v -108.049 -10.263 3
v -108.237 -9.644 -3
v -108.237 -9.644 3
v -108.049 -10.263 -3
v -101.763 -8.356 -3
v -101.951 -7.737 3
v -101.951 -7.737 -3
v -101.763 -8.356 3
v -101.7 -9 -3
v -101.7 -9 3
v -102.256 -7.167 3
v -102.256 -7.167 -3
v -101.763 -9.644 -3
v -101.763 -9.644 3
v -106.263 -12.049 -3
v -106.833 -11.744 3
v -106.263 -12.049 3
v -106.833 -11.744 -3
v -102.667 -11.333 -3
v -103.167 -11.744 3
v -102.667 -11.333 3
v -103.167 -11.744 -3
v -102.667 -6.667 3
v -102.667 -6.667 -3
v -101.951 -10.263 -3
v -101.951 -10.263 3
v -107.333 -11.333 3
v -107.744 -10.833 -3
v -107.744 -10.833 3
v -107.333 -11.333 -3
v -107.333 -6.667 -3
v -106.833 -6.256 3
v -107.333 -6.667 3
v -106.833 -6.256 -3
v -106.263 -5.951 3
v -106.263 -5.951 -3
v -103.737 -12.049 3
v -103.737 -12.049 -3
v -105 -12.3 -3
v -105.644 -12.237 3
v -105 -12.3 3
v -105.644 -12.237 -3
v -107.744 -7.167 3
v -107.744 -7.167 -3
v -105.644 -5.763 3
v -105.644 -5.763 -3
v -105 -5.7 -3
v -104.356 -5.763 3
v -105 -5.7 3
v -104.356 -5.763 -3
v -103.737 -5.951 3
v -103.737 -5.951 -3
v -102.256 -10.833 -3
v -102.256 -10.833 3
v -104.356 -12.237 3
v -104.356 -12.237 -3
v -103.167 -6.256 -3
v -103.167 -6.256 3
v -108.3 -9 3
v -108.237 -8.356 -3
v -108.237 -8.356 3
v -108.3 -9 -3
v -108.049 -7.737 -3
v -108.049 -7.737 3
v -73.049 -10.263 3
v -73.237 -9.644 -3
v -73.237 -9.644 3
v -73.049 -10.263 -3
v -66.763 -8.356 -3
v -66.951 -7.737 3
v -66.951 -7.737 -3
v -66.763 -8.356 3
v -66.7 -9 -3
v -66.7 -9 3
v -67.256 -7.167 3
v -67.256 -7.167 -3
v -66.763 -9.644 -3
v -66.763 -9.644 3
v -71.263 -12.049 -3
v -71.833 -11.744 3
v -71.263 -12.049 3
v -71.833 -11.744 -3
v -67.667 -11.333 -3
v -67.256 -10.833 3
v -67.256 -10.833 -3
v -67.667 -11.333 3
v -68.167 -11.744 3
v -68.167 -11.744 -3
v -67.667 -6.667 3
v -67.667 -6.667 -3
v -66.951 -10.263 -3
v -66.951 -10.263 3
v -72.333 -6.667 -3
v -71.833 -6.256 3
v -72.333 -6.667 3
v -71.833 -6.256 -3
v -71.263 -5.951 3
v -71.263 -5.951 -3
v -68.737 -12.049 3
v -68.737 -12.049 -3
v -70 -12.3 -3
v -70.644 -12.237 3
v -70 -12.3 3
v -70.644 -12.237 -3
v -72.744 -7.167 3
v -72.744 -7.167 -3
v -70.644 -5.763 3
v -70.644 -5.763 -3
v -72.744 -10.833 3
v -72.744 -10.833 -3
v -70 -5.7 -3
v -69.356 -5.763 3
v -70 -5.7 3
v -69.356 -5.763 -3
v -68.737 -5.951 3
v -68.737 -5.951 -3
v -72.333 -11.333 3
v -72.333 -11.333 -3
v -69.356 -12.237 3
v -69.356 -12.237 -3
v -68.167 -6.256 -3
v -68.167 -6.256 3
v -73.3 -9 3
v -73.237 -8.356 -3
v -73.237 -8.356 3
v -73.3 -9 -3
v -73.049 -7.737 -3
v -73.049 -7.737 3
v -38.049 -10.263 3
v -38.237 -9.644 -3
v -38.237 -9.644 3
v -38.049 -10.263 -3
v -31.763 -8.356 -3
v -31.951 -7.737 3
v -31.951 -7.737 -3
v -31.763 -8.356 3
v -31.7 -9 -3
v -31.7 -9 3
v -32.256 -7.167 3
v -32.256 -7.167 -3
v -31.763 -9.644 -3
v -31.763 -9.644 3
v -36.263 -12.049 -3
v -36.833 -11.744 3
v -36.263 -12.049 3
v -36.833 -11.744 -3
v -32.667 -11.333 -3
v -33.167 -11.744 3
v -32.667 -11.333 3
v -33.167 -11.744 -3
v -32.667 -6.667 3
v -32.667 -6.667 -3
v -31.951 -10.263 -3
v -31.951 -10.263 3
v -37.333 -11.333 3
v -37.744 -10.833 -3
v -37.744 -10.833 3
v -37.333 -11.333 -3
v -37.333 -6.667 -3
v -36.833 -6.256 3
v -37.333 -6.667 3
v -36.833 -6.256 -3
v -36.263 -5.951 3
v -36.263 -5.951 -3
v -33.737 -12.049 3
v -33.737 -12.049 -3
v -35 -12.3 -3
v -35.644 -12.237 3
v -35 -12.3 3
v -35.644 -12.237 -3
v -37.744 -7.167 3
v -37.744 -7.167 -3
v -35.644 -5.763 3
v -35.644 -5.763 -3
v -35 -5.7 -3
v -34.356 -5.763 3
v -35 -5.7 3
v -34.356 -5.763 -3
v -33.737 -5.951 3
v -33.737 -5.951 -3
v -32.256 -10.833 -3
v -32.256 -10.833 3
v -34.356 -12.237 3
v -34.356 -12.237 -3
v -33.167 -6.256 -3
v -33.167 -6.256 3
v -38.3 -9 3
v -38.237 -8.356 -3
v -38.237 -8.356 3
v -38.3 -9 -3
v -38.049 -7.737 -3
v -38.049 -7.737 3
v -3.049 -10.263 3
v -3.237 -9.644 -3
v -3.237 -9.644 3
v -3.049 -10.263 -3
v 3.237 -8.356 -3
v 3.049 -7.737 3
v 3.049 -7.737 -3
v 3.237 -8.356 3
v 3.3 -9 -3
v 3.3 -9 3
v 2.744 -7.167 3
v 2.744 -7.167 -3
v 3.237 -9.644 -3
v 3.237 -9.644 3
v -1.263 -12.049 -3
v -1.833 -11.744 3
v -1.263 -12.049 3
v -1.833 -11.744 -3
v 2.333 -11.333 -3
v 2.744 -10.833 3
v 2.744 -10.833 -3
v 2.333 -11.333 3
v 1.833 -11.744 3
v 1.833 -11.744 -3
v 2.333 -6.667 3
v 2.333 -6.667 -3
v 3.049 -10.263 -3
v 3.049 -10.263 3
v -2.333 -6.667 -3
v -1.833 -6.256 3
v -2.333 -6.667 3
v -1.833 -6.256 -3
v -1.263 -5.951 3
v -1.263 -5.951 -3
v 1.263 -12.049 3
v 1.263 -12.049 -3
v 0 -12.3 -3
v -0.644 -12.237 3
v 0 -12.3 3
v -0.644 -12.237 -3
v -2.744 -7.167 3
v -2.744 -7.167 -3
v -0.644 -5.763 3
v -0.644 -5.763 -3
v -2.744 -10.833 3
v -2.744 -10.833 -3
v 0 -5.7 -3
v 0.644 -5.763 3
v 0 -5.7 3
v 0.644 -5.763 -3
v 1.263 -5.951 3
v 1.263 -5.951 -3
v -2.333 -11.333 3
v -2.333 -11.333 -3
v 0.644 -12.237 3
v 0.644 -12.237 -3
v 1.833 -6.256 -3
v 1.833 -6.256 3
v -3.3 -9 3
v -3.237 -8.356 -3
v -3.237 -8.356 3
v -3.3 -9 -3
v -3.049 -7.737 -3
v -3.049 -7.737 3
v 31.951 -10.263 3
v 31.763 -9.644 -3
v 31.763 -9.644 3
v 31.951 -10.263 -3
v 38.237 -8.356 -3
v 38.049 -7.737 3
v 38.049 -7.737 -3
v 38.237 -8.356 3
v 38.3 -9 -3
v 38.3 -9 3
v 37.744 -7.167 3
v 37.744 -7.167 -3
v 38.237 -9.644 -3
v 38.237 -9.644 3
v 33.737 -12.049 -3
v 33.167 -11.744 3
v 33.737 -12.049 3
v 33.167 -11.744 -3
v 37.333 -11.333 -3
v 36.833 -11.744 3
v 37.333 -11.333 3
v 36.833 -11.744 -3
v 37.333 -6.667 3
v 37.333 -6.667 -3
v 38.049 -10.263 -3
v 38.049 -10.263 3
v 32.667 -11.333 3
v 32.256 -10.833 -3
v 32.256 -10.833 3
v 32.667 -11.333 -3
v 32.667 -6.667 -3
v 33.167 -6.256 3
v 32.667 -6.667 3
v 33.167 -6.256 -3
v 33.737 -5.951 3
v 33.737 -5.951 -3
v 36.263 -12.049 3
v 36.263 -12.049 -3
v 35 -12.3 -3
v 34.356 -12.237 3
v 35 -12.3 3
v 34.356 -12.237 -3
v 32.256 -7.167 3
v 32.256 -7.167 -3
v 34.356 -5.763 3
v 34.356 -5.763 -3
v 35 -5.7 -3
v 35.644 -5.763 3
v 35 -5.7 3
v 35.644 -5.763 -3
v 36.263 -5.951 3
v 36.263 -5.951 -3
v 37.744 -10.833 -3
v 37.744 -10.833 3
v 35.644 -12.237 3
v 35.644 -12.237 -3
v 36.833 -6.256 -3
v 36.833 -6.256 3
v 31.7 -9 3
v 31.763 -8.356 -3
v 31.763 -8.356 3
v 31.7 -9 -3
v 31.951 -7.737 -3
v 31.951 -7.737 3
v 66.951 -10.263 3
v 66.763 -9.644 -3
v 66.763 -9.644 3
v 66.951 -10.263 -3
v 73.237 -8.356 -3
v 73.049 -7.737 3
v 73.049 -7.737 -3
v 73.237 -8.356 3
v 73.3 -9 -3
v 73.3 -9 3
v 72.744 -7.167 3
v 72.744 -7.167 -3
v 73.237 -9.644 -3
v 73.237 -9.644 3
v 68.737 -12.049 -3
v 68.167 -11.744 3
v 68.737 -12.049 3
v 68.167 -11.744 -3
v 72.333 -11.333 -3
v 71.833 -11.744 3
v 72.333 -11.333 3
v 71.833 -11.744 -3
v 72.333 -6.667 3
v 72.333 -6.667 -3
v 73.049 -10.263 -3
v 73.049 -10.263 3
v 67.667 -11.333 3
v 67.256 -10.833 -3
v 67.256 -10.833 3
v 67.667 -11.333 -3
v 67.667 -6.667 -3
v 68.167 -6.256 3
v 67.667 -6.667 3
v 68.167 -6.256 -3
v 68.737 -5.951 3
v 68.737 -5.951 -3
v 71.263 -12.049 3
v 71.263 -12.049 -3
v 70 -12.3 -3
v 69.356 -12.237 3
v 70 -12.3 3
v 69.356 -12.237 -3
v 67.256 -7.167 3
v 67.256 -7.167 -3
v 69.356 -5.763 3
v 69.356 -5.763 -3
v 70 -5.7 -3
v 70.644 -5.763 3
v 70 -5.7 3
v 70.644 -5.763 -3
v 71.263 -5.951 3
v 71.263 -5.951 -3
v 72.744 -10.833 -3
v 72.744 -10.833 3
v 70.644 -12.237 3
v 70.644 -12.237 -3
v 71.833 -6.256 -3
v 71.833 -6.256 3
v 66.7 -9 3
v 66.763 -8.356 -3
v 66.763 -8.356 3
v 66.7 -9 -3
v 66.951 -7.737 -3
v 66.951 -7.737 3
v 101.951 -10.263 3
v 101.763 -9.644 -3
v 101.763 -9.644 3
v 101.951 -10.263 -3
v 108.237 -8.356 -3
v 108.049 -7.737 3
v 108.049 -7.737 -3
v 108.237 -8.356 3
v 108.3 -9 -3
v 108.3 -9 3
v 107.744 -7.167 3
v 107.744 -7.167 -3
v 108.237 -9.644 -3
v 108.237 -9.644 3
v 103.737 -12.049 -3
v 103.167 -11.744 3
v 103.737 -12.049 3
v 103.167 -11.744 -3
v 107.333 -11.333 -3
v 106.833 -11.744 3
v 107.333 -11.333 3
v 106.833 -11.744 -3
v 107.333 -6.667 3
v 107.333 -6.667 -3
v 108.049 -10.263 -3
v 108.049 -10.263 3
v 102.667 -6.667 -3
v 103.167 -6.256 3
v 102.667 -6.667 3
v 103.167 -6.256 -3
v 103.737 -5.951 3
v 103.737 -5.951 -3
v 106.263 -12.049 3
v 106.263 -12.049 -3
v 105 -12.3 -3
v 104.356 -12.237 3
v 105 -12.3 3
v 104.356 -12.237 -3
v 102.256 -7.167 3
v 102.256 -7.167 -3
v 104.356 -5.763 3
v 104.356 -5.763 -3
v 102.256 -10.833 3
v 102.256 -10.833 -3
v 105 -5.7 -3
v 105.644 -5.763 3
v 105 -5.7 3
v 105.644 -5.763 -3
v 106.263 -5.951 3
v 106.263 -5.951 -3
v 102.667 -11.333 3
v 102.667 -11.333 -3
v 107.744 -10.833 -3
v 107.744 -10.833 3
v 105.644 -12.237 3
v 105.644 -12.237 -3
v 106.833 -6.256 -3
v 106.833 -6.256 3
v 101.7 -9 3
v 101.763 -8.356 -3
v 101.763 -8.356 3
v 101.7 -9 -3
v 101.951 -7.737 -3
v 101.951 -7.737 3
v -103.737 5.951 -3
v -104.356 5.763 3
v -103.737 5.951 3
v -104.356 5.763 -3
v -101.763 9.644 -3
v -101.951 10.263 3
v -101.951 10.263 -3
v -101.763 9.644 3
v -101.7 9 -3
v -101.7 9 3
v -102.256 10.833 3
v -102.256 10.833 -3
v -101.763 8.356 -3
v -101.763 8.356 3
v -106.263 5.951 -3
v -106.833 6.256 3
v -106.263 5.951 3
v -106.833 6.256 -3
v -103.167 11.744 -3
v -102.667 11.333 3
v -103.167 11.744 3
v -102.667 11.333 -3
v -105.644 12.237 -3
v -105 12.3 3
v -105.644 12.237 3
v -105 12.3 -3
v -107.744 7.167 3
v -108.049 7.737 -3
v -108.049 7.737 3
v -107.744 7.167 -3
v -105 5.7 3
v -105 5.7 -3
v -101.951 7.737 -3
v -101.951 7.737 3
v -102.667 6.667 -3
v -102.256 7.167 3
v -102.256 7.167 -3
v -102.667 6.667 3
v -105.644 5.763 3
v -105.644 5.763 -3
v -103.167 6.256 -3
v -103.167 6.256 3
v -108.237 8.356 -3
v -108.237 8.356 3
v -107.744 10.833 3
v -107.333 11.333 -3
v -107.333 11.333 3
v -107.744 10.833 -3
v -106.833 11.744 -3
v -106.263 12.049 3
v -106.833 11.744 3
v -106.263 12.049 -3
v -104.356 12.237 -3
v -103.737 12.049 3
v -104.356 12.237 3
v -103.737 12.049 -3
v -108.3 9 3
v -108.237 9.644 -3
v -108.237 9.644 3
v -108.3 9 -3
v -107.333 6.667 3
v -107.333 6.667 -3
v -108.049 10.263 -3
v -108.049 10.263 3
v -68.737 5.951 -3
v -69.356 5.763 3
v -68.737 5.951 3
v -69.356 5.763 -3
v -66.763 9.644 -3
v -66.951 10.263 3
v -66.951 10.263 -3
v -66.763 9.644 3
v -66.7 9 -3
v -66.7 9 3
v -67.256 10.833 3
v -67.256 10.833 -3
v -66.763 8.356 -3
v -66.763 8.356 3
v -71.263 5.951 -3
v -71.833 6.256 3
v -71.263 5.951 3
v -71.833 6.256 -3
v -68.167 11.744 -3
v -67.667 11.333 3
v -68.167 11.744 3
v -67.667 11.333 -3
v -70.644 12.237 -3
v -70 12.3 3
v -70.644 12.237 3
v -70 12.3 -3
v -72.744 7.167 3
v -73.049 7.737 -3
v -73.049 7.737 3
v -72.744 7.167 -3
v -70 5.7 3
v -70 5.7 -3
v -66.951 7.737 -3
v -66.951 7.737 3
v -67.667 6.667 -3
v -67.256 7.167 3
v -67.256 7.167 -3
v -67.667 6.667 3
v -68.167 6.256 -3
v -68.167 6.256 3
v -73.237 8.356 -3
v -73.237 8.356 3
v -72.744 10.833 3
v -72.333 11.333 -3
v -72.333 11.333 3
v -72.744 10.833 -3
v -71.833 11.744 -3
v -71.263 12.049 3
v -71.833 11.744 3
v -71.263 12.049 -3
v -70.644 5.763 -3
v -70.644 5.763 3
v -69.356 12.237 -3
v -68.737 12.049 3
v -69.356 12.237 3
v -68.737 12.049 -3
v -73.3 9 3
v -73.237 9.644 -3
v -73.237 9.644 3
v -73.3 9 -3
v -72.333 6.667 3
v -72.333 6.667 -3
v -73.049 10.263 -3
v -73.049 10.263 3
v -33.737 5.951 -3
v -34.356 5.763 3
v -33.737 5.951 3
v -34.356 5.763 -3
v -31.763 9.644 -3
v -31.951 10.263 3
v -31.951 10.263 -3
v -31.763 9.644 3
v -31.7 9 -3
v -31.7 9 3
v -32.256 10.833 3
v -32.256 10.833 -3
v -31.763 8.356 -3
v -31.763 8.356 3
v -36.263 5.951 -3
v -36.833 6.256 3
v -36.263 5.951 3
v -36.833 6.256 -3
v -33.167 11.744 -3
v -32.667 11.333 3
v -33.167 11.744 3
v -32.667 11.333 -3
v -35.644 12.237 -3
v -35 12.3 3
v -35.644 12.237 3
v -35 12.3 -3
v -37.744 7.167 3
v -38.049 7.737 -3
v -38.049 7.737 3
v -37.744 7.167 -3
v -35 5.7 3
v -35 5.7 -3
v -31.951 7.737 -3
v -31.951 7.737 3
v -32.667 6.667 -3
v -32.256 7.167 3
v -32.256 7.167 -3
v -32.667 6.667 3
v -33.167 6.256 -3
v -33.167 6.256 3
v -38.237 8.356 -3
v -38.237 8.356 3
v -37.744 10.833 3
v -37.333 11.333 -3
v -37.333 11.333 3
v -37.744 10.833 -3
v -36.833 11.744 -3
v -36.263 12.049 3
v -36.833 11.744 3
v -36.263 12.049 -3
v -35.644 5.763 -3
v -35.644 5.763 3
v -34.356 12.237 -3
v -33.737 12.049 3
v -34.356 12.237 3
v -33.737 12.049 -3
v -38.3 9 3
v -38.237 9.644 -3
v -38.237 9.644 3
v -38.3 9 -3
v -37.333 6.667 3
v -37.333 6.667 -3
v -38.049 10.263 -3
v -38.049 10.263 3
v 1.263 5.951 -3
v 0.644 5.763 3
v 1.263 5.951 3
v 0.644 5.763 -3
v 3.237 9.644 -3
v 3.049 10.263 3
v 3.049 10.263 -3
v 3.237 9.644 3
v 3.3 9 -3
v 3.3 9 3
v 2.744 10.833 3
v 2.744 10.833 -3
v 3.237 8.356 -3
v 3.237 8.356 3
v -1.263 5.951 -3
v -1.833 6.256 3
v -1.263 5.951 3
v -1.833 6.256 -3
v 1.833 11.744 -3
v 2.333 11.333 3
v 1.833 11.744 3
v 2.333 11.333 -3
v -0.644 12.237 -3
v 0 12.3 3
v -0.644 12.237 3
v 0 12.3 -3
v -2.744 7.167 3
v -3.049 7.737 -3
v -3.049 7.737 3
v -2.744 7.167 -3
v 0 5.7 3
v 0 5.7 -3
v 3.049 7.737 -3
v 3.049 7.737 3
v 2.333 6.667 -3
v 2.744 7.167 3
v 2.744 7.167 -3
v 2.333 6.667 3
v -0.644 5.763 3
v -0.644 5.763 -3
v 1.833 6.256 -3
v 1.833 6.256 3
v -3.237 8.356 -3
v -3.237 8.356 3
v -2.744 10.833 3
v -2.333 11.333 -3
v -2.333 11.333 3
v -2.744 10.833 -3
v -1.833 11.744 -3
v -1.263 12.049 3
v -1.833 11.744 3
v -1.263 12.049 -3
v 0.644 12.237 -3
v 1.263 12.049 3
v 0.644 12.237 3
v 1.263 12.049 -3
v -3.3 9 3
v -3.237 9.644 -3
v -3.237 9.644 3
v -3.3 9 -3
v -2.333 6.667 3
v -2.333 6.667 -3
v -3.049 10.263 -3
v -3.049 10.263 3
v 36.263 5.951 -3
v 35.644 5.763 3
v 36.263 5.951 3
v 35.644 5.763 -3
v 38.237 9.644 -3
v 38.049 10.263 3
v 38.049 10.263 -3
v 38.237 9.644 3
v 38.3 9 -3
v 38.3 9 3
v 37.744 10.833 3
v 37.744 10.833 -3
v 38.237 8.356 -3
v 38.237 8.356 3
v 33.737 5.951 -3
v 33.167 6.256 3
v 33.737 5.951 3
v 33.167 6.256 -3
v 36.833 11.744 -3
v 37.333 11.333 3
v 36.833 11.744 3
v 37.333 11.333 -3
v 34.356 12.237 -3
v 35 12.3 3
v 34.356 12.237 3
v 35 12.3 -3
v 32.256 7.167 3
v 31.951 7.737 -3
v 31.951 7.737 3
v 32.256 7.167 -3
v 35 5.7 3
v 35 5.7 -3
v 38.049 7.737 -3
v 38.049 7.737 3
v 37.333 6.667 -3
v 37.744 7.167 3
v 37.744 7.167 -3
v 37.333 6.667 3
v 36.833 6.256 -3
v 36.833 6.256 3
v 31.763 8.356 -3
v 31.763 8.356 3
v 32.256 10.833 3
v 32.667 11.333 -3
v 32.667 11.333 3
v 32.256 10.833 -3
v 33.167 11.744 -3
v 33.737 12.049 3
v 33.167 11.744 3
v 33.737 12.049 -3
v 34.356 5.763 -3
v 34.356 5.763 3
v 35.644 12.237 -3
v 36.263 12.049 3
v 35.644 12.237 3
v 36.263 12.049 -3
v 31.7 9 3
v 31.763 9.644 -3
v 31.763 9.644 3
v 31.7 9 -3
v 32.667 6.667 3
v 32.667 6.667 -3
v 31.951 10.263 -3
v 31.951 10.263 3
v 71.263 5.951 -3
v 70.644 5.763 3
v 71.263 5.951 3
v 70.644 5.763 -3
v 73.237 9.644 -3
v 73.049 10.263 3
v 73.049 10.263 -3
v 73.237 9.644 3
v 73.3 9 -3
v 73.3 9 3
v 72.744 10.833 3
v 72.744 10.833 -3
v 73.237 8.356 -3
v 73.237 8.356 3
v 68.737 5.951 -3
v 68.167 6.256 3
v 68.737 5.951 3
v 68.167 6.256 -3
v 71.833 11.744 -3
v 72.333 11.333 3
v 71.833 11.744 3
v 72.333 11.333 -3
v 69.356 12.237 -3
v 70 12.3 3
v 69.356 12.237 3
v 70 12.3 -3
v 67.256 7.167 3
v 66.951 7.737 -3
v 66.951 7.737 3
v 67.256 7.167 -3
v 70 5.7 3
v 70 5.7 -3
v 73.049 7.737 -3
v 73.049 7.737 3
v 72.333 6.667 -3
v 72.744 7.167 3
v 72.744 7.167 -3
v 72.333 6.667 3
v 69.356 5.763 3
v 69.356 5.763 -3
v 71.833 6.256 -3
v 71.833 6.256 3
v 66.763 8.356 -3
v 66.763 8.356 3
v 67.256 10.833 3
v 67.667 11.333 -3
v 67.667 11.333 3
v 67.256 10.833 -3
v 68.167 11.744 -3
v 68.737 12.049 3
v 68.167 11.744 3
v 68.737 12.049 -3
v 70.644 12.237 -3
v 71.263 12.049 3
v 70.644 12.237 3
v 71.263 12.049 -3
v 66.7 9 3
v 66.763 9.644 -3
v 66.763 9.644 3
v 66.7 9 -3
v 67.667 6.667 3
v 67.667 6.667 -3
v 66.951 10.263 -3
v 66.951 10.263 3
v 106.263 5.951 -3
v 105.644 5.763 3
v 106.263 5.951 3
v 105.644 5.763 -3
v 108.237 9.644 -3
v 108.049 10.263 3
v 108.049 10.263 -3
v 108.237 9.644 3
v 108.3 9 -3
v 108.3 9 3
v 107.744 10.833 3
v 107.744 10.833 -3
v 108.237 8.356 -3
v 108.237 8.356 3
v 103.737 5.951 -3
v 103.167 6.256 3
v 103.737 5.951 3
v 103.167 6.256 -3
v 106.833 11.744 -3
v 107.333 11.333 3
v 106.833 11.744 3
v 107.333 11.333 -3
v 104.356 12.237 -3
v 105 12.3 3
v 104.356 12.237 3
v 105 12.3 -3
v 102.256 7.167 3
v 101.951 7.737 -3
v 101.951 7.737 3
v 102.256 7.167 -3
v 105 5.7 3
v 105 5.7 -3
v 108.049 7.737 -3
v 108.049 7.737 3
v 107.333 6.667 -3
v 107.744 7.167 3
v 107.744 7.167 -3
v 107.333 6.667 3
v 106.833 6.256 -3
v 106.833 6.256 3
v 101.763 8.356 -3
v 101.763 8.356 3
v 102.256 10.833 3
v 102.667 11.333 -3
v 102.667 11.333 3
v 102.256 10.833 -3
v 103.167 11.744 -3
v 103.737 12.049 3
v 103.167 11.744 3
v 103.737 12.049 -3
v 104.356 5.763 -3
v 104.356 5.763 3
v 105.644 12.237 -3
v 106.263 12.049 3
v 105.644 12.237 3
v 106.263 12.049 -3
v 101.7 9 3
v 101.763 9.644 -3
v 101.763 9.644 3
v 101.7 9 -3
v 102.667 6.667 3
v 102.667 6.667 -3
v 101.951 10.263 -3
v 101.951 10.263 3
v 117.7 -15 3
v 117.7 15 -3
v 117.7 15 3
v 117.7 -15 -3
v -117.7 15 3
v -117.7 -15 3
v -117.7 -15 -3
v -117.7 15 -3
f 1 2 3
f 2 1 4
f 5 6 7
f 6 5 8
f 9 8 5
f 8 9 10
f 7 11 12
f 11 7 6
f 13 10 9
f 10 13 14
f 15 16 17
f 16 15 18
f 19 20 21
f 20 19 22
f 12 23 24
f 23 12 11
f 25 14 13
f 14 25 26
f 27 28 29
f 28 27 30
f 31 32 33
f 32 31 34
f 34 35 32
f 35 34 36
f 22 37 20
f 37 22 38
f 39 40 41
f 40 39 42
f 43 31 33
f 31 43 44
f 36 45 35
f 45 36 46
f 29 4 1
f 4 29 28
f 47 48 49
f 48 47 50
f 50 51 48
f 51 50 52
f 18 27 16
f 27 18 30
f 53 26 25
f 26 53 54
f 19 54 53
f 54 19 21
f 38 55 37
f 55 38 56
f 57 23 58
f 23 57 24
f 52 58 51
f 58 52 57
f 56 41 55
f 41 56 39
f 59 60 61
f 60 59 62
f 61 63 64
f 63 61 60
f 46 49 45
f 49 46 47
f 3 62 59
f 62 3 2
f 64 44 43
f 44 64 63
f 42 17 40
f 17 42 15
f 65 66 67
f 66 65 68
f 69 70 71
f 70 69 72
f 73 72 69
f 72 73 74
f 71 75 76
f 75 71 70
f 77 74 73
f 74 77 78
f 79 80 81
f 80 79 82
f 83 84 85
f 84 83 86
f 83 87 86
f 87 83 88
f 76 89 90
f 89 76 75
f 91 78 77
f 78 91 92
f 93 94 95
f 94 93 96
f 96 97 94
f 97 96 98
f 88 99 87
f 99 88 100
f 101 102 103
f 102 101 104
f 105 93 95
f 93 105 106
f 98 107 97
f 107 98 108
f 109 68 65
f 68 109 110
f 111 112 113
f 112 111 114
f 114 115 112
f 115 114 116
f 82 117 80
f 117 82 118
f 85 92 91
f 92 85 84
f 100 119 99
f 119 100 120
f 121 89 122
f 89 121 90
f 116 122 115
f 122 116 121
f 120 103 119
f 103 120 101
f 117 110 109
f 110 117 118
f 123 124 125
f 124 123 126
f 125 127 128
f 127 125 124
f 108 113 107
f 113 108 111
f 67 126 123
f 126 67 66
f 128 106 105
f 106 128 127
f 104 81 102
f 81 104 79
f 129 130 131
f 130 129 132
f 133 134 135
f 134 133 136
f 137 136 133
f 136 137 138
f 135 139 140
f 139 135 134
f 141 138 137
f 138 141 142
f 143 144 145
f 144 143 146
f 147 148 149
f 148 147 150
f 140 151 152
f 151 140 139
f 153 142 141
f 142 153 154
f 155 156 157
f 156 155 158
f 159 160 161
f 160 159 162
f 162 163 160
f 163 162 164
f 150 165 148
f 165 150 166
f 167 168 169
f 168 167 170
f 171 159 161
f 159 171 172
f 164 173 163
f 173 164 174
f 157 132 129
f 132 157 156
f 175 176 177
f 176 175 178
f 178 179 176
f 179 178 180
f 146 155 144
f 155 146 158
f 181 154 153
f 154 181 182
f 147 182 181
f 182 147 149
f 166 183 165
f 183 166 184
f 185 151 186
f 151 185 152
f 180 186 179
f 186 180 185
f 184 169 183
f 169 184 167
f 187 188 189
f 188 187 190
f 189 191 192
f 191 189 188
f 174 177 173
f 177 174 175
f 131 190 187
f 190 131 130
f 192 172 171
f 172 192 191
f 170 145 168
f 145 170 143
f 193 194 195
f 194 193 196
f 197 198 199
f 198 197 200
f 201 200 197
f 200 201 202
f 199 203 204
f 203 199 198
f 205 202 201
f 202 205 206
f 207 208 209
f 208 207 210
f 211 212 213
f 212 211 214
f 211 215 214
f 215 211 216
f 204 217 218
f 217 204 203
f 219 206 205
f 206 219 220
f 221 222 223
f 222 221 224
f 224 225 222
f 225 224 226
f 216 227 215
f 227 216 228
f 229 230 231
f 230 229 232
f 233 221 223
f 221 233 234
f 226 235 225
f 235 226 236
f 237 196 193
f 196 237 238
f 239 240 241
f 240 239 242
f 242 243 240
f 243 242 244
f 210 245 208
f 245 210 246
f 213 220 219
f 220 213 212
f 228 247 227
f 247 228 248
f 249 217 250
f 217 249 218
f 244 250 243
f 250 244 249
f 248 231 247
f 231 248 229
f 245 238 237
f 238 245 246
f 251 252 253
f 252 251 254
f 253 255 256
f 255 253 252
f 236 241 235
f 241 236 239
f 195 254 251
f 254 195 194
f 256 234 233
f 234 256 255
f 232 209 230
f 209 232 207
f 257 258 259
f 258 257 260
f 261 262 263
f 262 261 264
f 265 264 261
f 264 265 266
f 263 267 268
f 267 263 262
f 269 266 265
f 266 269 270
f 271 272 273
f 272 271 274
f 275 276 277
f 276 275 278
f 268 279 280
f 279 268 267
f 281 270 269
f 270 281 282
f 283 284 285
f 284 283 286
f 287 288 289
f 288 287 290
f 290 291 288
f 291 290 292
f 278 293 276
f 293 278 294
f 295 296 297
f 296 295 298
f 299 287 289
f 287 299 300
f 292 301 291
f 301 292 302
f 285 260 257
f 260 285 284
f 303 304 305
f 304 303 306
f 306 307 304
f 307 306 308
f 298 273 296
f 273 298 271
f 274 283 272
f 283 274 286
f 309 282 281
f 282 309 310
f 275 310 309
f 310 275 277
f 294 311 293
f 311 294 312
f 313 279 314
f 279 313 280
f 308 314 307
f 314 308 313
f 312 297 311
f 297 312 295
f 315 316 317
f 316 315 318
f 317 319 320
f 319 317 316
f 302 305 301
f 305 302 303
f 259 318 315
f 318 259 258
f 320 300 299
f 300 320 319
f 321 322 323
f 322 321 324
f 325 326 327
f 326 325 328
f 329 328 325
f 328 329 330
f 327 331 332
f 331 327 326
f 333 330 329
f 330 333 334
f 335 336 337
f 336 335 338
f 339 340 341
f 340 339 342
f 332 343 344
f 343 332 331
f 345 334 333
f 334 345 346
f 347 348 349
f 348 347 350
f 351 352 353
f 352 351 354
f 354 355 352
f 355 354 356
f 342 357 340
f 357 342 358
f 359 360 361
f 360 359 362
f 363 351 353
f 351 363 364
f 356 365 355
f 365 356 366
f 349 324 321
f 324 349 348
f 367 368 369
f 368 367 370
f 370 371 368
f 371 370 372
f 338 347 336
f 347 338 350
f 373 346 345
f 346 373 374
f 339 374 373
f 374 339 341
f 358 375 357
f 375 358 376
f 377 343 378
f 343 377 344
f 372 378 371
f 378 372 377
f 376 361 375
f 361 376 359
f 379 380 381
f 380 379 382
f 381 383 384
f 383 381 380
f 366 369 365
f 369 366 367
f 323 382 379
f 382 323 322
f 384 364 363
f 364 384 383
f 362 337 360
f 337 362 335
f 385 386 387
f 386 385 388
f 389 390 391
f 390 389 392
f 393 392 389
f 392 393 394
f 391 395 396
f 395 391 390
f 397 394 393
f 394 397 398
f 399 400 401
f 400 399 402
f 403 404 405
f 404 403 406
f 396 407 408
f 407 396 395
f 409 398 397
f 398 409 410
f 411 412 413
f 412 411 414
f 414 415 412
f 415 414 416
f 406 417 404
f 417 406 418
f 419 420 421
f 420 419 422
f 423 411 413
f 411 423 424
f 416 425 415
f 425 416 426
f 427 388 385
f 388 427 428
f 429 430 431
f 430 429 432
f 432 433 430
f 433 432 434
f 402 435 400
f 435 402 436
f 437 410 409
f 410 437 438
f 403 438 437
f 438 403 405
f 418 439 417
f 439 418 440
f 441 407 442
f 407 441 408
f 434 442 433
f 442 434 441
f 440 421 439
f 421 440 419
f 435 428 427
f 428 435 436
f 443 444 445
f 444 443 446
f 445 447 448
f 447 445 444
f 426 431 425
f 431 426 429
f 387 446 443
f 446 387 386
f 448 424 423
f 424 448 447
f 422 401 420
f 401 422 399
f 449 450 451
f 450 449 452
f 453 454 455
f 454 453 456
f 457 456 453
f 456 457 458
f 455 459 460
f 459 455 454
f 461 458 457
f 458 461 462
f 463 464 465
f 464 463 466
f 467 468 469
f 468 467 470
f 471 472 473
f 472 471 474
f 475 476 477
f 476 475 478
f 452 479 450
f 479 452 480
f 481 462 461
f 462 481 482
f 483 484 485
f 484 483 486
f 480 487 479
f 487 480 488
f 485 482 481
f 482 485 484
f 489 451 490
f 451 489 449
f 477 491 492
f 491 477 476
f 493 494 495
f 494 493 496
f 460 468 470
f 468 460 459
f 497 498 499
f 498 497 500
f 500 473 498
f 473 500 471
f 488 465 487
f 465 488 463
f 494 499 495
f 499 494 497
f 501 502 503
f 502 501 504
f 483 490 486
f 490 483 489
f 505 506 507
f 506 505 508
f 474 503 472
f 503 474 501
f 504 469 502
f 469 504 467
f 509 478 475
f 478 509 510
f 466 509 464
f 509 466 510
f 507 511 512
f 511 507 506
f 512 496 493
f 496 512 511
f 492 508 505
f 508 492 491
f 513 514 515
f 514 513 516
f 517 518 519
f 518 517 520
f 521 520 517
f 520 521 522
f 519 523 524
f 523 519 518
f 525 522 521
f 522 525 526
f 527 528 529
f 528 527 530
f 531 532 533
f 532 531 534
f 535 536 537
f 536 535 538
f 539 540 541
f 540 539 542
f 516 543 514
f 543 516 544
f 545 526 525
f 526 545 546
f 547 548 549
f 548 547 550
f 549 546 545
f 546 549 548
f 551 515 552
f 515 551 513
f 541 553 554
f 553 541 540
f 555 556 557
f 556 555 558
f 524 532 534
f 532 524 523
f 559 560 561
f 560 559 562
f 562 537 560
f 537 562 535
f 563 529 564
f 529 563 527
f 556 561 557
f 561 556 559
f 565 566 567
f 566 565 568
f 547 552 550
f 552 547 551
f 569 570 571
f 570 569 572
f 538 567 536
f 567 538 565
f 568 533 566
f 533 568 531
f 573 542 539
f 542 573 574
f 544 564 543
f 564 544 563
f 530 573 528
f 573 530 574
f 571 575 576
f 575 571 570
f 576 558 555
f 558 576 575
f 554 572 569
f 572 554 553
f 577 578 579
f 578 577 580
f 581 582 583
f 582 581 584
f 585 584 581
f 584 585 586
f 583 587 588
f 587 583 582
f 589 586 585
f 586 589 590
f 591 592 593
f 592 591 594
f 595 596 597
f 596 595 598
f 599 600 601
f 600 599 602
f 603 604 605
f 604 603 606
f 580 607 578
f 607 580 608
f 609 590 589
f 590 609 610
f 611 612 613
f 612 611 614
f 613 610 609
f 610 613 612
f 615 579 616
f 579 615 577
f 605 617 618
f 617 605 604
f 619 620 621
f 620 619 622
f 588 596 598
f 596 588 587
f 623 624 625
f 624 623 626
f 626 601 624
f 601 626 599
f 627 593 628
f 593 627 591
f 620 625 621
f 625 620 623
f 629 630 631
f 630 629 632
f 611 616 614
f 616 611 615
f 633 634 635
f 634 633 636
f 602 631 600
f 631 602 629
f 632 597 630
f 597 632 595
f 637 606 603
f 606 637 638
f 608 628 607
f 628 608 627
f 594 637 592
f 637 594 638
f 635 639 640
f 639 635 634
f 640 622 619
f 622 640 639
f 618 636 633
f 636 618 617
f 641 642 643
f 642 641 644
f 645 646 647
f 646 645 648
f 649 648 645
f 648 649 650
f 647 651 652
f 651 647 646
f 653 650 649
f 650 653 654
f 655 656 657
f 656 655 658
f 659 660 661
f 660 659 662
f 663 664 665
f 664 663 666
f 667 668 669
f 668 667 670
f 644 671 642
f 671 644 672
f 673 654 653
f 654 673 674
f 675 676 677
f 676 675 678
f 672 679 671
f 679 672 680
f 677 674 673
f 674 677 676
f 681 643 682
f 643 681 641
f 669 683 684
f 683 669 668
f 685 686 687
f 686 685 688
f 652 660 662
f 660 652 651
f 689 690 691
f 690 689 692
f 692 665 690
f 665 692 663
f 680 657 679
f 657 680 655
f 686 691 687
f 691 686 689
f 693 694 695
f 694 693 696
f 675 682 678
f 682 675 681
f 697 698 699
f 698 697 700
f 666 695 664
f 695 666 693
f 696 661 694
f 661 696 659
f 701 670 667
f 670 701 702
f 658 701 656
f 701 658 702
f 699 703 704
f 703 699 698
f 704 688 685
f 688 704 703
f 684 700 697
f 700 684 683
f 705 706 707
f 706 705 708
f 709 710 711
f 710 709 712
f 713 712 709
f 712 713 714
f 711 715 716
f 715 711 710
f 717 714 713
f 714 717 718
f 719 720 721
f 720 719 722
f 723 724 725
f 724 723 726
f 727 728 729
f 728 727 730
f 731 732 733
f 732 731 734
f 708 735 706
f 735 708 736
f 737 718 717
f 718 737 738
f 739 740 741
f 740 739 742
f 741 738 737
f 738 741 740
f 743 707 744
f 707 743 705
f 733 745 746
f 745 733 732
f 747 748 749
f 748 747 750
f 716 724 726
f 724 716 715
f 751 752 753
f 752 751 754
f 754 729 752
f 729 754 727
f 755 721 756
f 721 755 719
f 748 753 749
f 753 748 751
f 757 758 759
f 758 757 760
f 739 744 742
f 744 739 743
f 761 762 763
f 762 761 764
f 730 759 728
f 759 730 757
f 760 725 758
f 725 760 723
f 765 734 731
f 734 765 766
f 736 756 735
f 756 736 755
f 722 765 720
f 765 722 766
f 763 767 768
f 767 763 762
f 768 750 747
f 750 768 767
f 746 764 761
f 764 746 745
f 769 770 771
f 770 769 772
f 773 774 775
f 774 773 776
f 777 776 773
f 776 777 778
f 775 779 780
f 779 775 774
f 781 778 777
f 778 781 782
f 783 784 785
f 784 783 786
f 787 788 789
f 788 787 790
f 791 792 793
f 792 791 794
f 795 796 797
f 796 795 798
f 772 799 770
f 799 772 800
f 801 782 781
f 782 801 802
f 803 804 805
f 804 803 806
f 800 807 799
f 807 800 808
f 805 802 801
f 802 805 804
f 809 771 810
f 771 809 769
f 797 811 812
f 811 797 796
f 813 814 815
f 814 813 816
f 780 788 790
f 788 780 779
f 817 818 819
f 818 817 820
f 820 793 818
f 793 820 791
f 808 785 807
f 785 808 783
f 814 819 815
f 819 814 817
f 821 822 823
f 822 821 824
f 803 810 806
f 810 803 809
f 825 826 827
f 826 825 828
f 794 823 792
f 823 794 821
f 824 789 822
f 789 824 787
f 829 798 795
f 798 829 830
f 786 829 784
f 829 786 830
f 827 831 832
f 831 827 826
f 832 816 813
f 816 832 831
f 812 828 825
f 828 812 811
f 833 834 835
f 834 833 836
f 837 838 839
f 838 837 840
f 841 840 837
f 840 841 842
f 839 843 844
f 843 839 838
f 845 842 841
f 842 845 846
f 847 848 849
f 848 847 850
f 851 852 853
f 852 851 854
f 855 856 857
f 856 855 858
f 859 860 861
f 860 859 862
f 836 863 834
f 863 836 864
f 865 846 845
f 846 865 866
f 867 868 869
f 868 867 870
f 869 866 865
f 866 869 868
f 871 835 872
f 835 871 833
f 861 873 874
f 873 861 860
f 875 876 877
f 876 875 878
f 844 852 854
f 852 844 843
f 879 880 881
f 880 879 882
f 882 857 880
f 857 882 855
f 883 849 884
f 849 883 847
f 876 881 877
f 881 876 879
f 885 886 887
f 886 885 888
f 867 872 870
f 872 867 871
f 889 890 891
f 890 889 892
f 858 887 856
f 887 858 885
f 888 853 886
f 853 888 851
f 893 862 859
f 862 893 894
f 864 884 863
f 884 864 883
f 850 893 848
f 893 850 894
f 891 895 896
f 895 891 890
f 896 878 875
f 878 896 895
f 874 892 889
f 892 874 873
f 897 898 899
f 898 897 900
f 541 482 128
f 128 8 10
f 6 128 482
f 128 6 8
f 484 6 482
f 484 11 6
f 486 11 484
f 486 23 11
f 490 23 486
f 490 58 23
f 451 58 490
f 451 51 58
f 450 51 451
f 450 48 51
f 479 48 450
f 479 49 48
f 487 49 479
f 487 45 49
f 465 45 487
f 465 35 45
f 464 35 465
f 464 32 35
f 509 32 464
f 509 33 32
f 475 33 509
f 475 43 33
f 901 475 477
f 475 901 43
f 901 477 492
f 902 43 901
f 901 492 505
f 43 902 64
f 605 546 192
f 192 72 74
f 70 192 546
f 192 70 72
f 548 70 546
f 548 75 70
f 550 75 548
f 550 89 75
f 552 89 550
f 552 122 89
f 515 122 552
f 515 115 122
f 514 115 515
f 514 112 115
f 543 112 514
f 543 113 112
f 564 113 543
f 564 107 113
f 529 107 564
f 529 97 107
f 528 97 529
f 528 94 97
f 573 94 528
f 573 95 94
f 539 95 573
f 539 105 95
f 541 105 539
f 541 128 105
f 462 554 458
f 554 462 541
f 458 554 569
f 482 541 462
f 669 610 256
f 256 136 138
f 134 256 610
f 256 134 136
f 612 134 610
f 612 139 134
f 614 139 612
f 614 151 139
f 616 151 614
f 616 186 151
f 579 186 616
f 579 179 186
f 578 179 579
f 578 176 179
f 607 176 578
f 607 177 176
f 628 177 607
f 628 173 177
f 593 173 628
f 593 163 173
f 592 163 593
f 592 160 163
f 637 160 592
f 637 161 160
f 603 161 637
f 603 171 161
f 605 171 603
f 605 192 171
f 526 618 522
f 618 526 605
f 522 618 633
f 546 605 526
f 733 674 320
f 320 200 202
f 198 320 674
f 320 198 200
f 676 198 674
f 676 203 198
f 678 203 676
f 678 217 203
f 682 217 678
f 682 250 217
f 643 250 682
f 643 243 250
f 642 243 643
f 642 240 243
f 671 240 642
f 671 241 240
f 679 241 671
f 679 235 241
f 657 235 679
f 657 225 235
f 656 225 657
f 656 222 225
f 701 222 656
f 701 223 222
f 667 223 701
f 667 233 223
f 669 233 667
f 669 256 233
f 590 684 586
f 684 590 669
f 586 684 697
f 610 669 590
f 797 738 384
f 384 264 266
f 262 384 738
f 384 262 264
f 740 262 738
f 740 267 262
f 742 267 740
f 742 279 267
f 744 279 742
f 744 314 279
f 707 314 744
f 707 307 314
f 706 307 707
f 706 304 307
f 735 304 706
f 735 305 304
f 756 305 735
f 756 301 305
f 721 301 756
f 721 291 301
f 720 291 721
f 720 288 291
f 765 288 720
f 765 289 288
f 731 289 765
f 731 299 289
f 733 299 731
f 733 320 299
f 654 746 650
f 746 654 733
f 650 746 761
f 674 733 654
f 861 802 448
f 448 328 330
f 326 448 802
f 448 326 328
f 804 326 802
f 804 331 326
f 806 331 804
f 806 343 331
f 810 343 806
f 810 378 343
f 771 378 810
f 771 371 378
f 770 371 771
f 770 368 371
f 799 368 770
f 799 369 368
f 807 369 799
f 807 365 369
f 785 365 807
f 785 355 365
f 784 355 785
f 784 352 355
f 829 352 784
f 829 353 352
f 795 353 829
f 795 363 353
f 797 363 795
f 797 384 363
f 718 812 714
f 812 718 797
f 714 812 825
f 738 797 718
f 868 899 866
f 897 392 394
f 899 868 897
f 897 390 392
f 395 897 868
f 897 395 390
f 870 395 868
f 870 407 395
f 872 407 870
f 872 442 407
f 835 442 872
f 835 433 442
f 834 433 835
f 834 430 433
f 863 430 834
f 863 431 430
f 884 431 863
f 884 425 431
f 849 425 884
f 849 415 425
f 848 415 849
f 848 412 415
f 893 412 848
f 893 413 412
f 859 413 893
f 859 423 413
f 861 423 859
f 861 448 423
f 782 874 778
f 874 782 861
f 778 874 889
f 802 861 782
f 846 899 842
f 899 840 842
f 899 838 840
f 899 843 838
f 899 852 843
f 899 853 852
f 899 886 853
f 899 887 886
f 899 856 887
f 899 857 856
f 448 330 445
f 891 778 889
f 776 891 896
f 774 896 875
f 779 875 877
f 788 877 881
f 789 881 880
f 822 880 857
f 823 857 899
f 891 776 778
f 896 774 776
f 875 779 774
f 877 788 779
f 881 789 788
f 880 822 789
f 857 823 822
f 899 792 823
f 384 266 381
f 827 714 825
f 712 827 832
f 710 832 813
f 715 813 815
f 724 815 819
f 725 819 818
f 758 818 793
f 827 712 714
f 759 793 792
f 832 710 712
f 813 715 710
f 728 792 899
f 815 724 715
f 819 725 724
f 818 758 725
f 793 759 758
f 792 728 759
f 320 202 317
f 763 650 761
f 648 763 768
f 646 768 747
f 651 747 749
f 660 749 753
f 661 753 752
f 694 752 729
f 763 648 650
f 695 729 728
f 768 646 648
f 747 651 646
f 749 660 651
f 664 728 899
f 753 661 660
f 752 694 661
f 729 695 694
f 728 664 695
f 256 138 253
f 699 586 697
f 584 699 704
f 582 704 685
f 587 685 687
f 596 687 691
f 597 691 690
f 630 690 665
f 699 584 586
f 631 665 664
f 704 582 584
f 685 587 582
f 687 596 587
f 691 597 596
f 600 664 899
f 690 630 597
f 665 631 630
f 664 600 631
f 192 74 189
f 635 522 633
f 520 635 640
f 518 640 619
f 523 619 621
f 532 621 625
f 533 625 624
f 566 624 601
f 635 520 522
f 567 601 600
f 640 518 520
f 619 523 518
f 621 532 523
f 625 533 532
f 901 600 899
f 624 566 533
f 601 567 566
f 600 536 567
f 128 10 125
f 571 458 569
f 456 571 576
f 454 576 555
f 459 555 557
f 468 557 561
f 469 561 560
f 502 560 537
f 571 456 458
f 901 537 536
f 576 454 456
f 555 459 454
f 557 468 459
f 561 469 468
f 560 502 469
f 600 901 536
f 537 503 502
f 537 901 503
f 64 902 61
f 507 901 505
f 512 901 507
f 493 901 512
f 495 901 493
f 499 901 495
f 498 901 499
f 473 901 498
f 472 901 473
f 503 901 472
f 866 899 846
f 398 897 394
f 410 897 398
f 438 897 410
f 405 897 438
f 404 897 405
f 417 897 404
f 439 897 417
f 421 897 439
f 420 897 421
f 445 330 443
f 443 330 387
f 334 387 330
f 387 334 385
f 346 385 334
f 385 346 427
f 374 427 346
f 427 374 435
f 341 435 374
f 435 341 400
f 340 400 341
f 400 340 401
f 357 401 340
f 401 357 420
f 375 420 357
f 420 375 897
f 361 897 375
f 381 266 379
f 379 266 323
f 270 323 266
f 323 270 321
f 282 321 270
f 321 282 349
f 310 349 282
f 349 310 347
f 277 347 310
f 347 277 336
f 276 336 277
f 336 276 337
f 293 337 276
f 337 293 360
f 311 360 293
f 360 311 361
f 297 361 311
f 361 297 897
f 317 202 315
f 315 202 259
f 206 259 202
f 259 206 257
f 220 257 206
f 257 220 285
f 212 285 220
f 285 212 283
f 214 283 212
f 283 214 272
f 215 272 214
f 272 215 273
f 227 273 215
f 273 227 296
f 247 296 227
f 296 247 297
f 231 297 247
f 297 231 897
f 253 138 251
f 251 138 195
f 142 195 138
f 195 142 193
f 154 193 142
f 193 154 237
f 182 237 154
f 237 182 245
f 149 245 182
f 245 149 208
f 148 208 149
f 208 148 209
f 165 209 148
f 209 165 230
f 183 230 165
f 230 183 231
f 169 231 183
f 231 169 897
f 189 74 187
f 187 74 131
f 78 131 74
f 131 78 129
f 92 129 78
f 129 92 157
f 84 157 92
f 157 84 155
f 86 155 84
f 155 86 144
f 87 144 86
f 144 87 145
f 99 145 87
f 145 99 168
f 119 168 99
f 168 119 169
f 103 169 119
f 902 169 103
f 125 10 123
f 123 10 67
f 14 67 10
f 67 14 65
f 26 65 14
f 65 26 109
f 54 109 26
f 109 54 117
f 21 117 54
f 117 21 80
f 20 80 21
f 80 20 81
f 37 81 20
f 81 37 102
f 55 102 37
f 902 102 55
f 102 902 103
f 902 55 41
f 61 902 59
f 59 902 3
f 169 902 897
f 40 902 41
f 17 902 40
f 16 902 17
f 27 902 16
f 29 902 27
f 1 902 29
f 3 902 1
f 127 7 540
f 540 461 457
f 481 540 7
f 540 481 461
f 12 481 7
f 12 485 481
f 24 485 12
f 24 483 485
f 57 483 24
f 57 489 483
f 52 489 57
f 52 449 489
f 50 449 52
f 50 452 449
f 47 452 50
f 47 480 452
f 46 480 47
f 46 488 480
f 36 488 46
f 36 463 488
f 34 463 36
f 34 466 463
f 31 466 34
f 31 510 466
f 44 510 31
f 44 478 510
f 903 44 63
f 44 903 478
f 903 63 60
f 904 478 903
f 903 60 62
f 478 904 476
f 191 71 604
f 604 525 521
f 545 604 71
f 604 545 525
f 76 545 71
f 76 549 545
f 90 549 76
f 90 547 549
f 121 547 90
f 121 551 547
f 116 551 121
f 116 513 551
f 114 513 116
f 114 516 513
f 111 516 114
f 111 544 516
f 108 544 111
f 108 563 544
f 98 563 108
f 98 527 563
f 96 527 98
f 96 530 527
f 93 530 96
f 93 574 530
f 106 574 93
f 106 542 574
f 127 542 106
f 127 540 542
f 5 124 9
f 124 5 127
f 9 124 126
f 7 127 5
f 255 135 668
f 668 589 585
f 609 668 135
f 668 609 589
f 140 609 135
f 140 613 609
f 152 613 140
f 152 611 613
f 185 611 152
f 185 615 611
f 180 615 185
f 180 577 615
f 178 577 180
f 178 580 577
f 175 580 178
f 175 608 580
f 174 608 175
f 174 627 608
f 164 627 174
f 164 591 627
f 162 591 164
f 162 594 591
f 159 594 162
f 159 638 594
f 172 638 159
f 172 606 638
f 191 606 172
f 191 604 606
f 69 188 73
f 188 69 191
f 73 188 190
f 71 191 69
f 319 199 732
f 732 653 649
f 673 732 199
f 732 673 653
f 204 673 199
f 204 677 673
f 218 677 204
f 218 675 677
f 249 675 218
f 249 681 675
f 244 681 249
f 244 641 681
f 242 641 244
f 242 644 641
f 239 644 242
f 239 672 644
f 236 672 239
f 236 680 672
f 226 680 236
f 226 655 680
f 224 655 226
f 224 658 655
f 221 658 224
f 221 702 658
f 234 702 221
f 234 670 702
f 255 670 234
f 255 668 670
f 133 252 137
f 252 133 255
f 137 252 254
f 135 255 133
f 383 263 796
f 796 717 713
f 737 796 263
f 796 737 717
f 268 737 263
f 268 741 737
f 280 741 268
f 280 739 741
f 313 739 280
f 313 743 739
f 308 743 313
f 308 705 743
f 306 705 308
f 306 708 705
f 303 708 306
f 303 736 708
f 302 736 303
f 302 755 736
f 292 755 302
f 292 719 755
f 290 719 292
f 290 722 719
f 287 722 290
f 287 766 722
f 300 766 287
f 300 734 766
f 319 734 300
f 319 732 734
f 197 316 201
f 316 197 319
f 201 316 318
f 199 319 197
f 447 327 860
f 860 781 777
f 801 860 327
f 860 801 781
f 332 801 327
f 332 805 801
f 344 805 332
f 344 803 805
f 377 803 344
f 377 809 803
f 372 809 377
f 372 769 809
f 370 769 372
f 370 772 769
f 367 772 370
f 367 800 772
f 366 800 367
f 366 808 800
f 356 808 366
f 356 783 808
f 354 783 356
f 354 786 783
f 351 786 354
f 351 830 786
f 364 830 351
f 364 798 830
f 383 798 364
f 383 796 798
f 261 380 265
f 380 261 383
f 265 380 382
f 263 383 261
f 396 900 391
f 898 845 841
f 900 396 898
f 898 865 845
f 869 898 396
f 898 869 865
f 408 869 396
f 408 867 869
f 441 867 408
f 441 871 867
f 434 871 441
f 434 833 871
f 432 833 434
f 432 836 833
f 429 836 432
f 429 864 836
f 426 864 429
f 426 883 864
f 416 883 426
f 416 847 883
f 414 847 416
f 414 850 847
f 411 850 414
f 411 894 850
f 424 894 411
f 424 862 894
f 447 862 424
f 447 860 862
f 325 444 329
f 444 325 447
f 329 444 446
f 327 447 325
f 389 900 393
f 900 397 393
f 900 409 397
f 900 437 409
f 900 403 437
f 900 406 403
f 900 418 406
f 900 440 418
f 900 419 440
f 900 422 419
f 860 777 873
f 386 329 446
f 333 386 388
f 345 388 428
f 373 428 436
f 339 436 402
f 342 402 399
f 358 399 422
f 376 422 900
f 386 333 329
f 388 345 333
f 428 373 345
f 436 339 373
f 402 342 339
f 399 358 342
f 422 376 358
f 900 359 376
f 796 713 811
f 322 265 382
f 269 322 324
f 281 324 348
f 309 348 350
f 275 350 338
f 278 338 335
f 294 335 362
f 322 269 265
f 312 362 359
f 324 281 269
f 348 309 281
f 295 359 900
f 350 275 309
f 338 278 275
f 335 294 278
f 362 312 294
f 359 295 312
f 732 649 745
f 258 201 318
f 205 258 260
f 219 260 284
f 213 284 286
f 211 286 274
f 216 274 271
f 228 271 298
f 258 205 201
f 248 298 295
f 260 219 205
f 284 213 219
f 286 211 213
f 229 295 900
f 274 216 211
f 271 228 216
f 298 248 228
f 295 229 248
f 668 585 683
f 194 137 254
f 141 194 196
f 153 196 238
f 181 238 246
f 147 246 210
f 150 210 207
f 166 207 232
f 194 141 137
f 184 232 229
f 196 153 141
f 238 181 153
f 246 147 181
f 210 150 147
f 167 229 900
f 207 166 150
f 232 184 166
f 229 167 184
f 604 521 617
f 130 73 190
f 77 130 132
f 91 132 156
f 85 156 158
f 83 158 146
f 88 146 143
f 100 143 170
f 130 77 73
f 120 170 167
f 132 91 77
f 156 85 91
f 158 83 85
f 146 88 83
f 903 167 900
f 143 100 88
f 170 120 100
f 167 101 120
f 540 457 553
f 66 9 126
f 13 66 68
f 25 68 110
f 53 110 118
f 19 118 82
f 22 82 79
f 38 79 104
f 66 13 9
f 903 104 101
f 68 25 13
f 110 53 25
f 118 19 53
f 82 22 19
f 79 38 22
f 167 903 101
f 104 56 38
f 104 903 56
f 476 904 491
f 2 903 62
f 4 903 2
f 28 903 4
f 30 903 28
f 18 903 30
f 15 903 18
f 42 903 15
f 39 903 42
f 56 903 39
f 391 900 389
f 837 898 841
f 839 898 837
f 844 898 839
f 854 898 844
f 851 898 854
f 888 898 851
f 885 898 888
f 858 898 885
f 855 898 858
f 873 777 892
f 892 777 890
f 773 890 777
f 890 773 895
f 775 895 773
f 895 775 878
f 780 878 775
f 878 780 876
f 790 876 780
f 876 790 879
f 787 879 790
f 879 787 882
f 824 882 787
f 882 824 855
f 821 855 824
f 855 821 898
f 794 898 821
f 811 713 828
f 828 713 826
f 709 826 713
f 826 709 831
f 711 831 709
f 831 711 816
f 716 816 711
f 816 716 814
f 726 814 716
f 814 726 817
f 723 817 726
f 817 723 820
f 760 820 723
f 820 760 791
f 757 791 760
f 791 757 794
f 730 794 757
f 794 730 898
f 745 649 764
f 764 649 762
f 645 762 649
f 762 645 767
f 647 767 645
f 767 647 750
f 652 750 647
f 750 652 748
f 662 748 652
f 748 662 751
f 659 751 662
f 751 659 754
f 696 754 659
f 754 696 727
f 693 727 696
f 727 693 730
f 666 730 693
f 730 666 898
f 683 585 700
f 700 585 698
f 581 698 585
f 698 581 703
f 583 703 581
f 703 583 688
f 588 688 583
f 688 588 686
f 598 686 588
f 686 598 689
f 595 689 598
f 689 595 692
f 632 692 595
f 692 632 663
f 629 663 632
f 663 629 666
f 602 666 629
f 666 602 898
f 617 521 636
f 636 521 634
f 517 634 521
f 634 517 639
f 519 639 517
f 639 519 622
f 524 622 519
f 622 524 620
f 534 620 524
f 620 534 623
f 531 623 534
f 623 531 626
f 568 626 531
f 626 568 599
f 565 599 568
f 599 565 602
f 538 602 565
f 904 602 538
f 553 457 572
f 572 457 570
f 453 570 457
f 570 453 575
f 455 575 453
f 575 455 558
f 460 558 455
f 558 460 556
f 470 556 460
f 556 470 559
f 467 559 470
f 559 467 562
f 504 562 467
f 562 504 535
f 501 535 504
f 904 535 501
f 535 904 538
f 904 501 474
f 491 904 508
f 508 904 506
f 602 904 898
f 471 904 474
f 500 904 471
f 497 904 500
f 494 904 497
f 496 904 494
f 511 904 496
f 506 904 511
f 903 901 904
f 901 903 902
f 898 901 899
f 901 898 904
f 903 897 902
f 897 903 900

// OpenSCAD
$fn = 32;

// ----------------------------------------------------------------------
// Hole bar, 7 x Ø6.6
// tworows layout, 12.7 mm edge offset
// ----------------------------------------------------------------------

// --- parameters (mm) ---
bar_w = 30;       // bar width (Y)
bar_t = 6;        // bar thickness (Z)
holes = 7;        // holes per row
hole_d = 6.6;     // hole diameter
edge = 12.7;      // offset from the bar end to the first hole
pitch = 35;       // pitch between neighbouring holes
row_offset = 18;  // distance between the two rows

// --- derived feature positions (mm) ---
span = (holes - 1) * pitch;   // = 210   distance between the end holes
bar_l = span + 2 * edge;      // = 235.4   overall bar length
start_x = -bar_l / 2 + edge;  // = -105   X of the first hole
feature_centers = [
  [start_x + 0 * pitch, -row_offset / 2],
  [start_x + 1 * pitch, -row_offset / 2],
  [start_x + 2 * pitch, -row_offset / 2],
  [start_x + 3 * pitch, -row_offset / 2],
  [start_x + 4 * pitch, -row_offset / 2],
  [start_x + 5 * pitch, -row_offset / 2],
  [start_x + 6 * pitch, -row_offset / 2]
];   // hole centres of the first row
row2_centers = [
  [start_x + 0 * pitch, row_offset / 2],
  [start_x + 1 * pitch, row_offset / 2],
  [start_x + 2 * pitch, row_offset / 2],
  [start_x + 3 * pitch, row_offset / 2],
  [start_x + 4 * pitch, row_offset / 2],
  [start_x + 5 * pitch, row_offset / 2],
  [start_x + 6 * pitch, row_offset / 2]
];   // hole centres of the second row

// bar with two rows of holes, both read from their own centre arrays
difference() {
  translate([-bar_l / 2, -bar_w / 2, -bar_t / 2]) cube([bar_l, bar_w, bar_t]);
  for (centre = feature_centers)
    translate([centre[0], centre[1], 0])
      cylinder(d = hole_d, h = bar_t + 2, center = true);
  for (centre = row2_centers)
    translate([centre[0], centre[1], 0])
      cylinder(d = hole_d, h = bar_t + 2, center = true);
}
